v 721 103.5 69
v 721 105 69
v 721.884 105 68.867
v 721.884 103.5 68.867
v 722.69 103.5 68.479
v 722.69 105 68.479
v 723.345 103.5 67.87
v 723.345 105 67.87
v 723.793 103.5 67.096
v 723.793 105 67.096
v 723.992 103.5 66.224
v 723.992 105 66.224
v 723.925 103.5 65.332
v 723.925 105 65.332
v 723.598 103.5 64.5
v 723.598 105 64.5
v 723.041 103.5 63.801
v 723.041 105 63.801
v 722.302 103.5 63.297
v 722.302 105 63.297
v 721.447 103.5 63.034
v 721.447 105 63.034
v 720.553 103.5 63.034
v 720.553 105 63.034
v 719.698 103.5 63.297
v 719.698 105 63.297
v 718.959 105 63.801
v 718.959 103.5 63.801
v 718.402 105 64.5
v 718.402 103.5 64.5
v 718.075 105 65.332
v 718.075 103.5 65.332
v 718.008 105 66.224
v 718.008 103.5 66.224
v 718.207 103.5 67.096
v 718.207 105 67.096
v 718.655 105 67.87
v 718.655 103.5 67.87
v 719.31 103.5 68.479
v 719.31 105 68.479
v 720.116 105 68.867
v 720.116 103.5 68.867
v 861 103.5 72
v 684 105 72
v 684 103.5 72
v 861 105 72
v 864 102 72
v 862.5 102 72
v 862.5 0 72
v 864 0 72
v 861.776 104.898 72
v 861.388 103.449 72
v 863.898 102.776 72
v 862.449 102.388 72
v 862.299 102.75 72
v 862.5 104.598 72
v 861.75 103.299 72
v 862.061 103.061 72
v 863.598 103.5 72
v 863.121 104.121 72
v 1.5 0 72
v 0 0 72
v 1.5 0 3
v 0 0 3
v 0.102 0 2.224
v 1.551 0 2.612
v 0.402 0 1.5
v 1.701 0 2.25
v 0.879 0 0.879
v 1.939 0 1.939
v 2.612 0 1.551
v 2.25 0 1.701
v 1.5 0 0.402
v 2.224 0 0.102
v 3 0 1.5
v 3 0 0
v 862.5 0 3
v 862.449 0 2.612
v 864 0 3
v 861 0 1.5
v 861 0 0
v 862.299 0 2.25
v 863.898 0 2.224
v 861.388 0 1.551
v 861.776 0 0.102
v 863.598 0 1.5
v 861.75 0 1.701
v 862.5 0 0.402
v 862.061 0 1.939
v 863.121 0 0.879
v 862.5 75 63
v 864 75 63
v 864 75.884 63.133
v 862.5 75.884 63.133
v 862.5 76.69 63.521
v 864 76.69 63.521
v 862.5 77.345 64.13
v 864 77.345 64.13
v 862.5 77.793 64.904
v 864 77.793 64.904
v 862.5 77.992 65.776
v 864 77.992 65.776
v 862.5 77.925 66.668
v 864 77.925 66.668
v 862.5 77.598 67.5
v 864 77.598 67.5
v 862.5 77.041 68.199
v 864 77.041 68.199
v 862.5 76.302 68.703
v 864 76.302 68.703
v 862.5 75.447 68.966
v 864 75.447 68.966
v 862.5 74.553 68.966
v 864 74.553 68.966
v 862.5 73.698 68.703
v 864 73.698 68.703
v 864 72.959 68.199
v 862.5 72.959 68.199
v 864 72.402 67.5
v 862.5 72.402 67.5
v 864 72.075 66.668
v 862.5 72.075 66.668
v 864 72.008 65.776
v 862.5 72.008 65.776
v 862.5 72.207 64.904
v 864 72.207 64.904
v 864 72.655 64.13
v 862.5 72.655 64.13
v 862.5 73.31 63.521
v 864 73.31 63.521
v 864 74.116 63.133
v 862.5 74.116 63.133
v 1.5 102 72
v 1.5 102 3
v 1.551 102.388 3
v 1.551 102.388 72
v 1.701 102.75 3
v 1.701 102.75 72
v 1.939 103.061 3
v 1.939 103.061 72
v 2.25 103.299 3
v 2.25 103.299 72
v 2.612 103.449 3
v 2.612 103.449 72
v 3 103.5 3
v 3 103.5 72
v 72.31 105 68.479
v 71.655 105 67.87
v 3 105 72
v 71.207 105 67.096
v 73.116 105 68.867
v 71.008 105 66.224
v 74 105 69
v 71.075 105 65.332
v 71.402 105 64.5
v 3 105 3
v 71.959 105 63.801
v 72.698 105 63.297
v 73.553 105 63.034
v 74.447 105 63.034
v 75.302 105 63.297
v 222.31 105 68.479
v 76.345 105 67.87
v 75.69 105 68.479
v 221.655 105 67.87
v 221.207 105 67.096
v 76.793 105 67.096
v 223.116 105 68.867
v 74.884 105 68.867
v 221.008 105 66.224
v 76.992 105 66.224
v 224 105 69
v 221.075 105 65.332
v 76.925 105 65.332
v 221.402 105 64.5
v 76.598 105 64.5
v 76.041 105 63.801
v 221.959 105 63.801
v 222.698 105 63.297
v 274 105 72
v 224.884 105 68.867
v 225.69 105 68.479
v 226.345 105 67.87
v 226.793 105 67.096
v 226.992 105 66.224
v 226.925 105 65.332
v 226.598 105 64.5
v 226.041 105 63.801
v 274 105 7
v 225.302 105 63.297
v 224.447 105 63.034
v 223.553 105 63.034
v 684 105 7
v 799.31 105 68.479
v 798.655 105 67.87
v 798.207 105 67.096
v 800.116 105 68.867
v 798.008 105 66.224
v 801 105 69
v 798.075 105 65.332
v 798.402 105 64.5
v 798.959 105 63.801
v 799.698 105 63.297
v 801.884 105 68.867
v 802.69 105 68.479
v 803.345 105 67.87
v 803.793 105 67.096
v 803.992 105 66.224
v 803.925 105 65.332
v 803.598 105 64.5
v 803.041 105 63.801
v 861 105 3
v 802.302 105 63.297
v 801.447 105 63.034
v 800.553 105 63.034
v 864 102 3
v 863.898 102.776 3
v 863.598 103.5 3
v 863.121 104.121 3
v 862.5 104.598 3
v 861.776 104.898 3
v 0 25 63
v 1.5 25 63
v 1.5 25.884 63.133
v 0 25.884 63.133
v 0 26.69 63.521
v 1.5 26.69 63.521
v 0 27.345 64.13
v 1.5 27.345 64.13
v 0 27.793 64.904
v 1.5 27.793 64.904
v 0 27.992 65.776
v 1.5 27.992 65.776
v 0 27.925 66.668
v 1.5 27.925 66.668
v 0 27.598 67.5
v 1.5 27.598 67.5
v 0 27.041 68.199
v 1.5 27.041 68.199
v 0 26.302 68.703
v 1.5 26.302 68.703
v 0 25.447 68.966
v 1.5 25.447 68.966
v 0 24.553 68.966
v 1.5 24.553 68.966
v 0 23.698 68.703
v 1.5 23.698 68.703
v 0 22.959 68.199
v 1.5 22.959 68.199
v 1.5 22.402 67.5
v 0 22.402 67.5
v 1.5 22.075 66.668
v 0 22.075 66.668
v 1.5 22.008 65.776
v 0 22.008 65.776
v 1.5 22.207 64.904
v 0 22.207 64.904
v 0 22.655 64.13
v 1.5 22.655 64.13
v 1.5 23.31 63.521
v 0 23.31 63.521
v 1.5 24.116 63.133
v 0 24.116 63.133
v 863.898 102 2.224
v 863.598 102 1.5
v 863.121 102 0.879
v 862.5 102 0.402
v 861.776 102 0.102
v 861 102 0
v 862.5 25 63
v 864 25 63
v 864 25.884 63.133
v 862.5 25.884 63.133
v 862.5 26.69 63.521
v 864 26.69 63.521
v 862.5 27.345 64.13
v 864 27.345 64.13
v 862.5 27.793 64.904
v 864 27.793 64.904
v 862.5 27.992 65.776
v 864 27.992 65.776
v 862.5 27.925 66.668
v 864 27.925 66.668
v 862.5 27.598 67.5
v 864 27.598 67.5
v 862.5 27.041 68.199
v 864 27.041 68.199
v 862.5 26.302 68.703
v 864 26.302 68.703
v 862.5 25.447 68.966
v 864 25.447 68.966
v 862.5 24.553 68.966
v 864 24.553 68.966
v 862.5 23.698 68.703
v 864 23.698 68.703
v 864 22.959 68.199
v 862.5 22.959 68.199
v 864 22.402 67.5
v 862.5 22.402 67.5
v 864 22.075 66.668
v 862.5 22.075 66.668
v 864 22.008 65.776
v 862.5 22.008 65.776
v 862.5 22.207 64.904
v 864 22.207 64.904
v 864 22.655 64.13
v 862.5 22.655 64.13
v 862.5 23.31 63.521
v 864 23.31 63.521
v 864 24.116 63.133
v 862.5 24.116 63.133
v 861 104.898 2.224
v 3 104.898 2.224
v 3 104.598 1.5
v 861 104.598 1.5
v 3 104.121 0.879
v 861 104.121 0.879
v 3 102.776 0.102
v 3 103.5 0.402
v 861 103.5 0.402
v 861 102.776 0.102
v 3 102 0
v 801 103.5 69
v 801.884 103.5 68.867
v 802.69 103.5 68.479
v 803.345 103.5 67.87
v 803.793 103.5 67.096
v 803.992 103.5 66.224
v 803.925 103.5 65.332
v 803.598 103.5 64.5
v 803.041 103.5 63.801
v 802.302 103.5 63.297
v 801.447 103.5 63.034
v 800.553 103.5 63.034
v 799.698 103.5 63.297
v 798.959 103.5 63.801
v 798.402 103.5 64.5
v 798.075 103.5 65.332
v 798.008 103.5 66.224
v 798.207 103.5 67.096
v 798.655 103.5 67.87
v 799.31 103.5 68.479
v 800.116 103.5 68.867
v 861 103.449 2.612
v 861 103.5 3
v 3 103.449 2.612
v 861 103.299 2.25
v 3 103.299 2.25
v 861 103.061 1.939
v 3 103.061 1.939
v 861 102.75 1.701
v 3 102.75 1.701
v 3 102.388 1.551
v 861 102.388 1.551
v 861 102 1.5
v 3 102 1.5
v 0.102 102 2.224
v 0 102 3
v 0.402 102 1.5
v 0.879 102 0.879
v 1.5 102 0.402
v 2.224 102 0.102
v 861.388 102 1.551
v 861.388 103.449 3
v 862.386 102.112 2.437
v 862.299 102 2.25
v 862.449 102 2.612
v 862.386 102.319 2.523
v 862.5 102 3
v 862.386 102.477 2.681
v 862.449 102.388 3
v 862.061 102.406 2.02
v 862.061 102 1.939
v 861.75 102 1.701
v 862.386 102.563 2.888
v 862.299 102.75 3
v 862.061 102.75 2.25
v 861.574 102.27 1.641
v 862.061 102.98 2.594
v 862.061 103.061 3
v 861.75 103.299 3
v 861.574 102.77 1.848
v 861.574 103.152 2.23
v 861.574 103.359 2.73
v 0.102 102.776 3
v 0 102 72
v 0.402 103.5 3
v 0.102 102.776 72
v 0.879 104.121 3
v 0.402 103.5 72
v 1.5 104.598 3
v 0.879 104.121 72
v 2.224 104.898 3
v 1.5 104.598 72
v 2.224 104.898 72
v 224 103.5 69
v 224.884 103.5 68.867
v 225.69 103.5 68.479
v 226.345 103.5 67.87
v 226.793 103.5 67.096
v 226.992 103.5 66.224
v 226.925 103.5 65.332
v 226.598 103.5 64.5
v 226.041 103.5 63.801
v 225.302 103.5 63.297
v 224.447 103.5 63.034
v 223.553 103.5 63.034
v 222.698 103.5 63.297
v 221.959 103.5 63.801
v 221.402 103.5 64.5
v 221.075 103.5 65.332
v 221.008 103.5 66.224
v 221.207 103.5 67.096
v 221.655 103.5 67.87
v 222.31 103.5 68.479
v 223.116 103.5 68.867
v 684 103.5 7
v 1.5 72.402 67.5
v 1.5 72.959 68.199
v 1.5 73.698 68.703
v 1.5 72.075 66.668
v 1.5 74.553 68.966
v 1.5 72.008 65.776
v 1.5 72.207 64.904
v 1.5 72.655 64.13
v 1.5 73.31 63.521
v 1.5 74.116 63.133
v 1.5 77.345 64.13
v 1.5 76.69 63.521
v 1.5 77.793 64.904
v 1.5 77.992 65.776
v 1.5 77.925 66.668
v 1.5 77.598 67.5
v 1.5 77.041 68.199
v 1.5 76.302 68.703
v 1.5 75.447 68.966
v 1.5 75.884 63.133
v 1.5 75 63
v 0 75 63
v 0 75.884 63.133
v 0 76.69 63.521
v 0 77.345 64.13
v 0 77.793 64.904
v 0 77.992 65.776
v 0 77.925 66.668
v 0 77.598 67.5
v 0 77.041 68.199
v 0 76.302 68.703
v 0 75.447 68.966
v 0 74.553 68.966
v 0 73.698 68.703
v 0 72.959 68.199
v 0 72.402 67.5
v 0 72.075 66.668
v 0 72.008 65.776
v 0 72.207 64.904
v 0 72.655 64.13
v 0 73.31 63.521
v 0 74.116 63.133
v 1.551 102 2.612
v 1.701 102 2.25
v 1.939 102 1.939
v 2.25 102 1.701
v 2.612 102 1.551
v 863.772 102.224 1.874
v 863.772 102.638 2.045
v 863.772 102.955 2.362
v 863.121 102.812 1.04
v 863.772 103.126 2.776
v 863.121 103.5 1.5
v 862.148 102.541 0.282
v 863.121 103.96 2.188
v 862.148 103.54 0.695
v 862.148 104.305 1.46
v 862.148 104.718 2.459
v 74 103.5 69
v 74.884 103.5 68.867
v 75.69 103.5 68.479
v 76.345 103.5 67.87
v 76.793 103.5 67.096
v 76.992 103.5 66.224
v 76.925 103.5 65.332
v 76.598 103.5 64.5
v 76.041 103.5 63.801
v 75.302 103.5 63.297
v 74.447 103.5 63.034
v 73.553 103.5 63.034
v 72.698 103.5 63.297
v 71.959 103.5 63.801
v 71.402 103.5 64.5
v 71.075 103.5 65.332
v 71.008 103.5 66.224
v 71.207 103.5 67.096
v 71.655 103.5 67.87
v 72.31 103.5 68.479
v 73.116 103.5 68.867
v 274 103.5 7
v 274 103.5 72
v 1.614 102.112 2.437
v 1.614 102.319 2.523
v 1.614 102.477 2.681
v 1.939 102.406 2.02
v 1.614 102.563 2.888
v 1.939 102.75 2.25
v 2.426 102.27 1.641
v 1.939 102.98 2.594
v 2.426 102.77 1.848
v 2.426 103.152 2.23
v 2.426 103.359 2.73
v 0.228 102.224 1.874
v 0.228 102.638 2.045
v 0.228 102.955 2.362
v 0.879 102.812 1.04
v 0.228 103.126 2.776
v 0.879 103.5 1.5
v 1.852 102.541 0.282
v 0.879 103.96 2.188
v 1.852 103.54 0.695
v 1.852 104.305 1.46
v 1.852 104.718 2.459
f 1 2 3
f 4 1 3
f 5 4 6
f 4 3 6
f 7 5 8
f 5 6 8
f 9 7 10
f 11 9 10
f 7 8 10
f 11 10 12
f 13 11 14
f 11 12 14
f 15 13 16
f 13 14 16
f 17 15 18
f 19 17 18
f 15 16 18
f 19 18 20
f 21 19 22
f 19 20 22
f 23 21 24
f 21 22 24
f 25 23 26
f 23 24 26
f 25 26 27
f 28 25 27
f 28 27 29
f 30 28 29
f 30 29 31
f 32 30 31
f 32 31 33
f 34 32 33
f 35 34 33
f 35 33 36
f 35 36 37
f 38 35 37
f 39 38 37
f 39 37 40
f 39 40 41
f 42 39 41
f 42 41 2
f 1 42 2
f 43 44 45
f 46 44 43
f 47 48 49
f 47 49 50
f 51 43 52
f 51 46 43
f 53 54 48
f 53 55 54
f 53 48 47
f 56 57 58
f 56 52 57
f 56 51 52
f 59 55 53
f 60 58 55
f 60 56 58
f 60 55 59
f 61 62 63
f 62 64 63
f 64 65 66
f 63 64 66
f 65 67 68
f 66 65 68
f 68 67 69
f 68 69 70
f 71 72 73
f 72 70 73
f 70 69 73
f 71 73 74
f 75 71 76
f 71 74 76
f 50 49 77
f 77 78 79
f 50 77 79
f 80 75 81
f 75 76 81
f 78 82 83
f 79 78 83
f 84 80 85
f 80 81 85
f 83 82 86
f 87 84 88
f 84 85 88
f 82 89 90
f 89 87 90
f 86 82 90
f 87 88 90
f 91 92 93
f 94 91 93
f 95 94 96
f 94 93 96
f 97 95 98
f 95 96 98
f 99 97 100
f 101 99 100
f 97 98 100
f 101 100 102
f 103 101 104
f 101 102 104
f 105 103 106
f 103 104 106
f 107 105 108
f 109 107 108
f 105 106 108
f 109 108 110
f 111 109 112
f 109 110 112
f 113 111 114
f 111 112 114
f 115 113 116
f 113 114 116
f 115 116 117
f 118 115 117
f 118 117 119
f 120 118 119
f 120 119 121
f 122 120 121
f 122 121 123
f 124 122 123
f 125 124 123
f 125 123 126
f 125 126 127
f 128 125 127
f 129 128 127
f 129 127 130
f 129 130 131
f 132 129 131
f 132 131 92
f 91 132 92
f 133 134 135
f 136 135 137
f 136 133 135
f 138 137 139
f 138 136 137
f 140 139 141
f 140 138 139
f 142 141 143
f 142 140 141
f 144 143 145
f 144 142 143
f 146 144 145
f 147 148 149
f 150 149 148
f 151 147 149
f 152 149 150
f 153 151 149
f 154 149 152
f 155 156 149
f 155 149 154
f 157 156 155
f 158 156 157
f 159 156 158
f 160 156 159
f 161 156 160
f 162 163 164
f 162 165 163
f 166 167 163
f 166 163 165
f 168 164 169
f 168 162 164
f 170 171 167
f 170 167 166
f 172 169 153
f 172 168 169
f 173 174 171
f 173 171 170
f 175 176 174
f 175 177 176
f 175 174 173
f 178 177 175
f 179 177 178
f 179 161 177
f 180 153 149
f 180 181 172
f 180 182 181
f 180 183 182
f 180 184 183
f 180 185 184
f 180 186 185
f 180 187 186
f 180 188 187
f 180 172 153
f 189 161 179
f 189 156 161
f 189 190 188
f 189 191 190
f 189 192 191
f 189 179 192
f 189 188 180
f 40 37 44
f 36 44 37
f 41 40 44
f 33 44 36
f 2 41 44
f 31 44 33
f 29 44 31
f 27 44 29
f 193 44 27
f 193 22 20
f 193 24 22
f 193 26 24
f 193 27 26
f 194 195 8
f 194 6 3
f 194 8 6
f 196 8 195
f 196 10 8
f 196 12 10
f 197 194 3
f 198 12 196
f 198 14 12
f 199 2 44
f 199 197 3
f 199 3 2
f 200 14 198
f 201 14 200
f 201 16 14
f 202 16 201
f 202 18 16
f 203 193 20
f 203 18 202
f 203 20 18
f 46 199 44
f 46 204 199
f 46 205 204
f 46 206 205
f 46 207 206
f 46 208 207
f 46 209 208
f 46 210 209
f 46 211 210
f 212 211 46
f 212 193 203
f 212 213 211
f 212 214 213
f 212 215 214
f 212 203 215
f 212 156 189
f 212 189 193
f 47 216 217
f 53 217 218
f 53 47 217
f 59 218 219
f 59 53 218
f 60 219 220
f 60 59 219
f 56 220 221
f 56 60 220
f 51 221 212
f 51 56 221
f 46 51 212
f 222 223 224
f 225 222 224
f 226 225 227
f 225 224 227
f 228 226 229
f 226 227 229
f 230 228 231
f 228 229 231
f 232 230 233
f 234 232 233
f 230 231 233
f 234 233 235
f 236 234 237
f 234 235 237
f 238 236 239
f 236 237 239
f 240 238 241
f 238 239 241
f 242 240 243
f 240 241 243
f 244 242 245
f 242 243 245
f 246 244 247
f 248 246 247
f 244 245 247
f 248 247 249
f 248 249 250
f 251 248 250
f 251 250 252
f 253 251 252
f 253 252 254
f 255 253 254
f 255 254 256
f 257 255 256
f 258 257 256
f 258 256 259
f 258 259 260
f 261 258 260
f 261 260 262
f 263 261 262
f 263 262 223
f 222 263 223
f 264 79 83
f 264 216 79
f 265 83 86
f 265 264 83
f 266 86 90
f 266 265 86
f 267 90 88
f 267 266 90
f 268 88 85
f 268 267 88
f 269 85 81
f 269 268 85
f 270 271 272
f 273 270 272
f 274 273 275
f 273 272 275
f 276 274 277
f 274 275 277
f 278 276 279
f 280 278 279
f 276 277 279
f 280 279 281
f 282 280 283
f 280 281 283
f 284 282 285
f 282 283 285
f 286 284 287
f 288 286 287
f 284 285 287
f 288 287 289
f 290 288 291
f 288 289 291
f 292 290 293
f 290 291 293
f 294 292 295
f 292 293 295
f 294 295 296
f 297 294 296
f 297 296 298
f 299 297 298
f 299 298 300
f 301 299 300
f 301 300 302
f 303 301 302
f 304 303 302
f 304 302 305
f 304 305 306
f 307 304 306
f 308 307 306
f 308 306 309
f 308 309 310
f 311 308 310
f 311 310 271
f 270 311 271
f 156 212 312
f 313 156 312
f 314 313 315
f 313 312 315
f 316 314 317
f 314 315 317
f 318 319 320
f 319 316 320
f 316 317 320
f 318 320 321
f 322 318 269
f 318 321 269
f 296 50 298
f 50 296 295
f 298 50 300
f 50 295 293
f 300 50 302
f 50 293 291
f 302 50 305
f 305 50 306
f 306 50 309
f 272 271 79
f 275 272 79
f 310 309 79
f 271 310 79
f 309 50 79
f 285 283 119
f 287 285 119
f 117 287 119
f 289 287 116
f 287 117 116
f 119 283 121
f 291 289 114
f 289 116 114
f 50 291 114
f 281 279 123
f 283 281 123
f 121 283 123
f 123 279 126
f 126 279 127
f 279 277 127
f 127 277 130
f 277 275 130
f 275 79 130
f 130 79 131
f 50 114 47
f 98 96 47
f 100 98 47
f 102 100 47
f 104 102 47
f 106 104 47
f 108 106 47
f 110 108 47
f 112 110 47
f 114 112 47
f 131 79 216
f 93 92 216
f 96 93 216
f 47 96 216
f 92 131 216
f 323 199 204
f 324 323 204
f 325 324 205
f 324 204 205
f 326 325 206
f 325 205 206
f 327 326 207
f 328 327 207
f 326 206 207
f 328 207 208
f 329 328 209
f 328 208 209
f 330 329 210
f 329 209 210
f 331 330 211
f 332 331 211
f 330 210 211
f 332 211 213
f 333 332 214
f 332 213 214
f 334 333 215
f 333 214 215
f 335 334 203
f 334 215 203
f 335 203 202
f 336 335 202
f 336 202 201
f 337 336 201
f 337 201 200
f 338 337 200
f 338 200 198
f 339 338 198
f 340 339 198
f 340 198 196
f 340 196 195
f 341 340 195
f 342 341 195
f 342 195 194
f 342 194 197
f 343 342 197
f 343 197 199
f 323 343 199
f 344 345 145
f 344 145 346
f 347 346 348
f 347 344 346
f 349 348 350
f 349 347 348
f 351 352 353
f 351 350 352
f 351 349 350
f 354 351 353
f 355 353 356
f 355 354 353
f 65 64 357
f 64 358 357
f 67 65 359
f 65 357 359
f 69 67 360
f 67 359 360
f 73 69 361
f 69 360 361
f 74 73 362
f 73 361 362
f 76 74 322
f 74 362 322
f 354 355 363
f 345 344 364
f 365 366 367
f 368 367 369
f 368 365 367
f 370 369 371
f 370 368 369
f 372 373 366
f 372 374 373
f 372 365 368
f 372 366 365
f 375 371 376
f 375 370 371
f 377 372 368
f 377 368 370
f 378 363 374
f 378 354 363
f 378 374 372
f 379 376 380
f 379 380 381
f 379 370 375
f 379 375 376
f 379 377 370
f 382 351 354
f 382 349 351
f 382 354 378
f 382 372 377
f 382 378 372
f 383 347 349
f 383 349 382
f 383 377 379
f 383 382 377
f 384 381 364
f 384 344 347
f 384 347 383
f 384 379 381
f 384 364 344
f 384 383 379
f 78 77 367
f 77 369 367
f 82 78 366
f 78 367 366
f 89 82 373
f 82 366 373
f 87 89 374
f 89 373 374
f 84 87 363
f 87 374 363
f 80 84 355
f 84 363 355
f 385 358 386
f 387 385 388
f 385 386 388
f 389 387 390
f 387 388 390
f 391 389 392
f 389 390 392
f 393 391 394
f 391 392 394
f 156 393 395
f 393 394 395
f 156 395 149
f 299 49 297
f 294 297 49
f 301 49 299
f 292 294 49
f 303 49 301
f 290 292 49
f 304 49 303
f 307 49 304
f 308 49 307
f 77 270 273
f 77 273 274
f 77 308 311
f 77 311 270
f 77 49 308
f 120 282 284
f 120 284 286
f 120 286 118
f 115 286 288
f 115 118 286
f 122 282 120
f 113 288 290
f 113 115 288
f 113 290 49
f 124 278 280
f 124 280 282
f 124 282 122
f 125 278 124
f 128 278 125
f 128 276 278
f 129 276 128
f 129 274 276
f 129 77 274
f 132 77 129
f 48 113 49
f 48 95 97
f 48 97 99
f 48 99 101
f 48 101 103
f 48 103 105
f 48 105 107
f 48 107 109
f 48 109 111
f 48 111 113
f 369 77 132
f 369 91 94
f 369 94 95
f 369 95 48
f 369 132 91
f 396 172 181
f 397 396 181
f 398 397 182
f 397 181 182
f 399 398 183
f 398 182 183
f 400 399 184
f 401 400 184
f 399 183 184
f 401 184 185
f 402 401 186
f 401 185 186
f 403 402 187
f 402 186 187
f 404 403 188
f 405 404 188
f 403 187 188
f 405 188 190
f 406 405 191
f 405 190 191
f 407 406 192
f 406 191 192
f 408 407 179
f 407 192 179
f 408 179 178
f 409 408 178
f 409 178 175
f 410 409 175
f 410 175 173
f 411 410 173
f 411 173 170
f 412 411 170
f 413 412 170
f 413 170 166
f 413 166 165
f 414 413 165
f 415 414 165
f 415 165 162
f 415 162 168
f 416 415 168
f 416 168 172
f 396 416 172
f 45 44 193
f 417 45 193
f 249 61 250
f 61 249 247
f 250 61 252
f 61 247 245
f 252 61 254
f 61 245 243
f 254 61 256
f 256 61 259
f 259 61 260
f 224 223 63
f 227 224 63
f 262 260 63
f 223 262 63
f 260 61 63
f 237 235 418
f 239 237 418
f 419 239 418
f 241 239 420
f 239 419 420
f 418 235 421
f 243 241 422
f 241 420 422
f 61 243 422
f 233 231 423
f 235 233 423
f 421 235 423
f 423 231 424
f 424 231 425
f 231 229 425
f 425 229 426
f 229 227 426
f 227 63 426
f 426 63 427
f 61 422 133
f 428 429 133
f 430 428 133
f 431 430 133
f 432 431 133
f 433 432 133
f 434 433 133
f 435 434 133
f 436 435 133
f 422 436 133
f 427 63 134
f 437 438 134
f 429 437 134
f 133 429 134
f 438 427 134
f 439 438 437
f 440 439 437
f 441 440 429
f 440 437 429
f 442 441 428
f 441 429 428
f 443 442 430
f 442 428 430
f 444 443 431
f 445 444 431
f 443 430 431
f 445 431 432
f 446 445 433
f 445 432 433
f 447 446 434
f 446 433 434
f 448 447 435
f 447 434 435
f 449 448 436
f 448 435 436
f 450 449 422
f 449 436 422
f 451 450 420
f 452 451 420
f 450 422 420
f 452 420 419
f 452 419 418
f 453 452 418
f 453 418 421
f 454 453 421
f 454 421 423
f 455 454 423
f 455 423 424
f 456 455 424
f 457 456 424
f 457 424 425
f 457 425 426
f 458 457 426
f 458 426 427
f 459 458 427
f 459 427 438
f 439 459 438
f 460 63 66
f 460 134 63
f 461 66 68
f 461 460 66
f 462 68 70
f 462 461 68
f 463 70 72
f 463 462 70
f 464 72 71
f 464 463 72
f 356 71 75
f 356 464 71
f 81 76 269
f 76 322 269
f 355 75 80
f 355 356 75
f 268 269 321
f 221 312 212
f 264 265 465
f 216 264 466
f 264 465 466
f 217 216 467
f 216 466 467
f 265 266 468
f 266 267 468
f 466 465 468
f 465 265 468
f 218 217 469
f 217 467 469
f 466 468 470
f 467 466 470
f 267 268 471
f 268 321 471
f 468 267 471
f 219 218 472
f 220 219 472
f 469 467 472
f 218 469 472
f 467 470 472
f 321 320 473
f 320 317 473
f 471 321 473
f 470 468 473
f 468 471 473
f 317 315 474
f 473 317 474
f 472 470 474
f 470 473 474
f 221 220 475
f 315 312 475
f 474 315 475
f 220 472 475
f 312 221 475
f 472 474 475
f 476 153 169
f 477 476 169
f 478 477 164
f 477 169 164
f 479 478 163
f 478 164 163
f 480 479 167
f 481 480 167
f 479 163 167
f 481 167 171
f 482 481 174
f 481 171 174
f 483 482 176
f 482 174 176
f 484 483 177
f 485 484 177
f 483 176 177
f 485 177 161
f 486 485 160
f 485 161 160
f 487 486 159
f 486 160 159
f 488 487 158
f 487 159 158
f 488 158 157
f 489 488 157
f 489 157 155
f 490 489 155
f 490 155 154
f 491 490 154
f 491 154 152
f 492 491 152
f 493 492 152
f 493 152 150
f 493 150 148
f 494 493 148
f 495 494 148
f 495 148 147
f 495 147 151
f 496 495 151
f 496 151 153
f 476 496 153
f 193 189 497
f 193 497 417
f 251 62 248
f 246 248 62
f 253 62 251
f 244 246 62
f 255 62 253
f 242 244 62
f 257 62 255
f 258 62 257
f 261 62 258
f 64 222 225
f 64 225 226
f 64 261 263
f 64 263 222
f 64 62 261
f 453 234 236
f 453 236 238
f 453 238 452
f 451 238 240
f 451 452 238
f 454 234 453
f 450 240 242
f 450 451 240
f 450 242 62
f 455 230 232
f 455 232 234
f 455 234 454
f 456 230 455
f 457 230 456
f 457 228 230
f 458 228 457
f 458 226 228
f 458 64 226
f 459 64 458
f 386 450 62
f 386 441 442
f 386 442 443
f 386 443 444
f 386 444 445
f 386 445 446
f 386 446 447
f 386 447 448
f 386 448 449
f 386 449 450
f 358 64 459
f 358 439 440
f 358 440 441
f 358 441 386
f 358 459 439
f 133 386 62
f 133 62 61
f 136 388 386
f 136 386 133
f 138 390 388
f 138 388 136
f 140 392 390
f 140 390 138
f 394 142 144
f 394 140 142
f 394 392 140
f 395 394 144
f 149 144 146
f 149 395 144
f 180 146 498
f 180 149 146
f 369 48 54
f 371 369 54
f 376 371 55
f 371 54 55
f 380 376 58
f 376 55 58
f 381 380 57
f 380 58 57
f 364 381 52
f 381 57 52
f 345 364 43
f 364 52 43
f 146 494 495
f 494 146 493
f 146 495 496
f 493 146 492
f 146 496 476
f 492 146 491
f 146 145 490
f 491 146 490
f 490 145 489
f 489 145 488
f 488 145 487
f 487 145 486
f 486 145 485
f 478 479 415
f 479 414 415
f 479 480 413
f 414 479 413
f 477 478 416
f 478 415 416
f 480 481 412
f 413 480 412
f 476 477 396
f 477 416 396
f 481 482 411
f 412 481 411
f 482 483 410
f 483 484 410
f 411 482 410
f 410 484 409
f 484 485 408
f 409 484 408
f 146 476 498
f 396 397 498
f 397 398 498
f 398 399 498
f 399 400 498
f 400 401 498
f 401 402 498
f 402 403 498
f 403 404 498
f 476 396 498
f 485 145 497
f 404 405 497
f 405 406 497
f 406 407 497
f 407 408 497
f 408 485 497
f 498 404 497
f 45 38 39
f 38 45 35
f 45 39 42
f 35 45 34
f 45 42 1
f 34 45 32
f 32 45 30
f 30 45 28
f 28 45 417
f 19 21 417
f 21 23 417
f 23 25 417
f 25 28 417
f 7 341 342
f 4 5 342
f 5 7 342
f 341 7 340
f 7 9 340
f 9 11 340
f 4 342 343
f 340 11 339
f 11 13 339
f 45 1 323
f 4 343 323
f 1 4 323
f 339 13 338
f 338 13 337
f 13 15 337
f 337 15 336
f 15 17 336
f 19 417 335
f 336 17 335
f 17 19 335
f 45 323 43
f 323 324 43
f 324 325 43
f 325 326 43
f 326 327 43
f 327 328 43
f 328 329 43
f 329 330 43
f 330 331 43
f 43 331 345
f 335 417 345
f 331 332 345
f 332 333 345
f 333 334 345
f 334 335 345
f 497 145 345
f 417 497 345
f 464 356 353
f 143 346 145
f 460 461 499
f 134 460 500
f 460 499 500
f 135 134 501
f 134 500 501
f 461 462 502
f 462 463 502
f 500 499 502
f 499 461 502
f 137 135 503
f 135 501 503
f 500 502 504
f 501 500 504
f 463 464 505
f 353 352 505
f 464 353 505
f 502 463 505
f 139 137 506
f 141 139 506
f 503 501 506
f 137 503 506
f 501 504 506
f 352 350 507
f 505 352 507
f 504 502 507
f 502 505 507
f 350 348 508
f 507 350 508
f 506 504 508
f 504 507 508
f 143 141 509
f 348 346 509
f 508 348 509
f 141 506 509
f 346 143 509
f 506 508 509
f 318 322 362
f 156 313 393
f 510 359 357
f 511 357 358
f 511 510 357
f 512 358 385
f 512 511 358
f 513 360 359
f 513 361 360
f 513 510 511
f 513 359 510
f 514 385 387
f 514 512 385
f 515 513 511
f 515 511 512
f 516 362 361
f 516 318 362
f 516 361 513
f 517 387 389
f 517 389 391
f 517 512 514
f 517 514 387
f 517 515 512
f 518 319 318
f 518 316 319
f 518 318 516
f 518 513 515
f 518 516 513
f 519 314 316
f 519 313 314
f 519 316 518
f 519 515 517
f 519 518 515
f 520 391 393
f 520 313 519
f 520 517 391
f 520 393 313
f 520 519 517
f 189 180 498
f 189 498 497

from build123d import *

# Parameters (mm, degrees)
SKETCH_1_W          = 864
SKETCH_1_H          = 105
EXTRUDE_1_DEPTH     = 72
FILLET_1_R          = 3
SHELL_1_T           = -1.5
SKETCH_3_W          = 410
SKETCH_3_H          = 65
CUT_EXTRUDE_2_DEPTH = 65
SKETCH_4_R          = 3
CUT_EXTRUDE_3_DEPTH = 874.329834599
SKETCH_5_R          = 3
CUT_EXTRUDE_4_DEPTH = 10


with BuildPart() as part:
    # 草图1 → 凸台-拉伸1 (new body)
    with BuildSketch(Plane.XY):
        with Locations((432, 52.5)):
            Rectangle(SKETCH_1_W, SKETCH_1_H)
    extrude(amount=EXTRUDE_1_DEPTH)

    # 圆角1
    fillet_1_edges = [part.edges().sort_by_distance(p)[0] for p in [
        (432, 105, 0),
        (864, 52.5, 0),
        (0, 52.5, 0),
        (0, 105, 36),
        (864, 105, 36),
    ]]
    fillet(fillet_1_edges, radius=FILLET_1_R)

    # 抽壳1
    shell_1_openings = [part.faces().sort_by_distance(p)[0] for p in [
        (432, 52.497793003, 72),
        (432, 0, 36.002193962),
    ]]
    offset(amount=SHELL_1_T, openings=shell_1_openings, kind=Kind.INTERSECTION)

    # 草图3 → 切除-拉伸2 (cut)
    with BuildSketch(Plane(origin=(0, 105, 0), x_dir=(1, 0, 0), z_dir=(0, 1, 0))):
        with Locations((479, -39.5)):
            Rectangle(SKETCH_3_W, SKETCH_3_H)
    extrude(amount=-CUT_EXTRUDE_2_DEPTH, mode=Mode.SUBTRACT)

    # 草图4 → 切除-拉伸3 (cut, through all)
    with BuildSketch(Plane(origin=(864, 0, 0), x_dir=(0, 0, -1), z_dir=(1, 0, 0))):
        with Locations((-66, 75)):
            Circle(SKETCH_4_R)
        with Locations((-66, 25)):
            Circle(SKETCH_4_R)
    extrude(amount=-CUT_EXTRUDE_3_DEPTH, mode=Mode.SUBTRACT)

    # 草图5 → 切除-拉伸4 (cut)
    with BuildSketch(Plane(origin=(0, 105, 0), x_dir=(1, 0, 0), z_dir=(0, 1, 0))):
        with Locations(Location((721, -66, 0), (0, 0, 270))):
            Circle(SKETCH_5_R)
        with Locations(Location((801, -66, 0), (0, 0, 270))):
            Circle(SKETCH_5_R)
        with Locations(Location((74, -66, 0), (0, 0, 270))):
            Circle(SKETCH_5_R)
        with Locations(Location((224, -66, 0), (0, 0, 270))):
            Circle(SKETCH_5_R)
    extrude(amount=-CUT_EXTRUDE_4_DEPTH, mode=Mode.SUBTRACT)


solid = part.part
